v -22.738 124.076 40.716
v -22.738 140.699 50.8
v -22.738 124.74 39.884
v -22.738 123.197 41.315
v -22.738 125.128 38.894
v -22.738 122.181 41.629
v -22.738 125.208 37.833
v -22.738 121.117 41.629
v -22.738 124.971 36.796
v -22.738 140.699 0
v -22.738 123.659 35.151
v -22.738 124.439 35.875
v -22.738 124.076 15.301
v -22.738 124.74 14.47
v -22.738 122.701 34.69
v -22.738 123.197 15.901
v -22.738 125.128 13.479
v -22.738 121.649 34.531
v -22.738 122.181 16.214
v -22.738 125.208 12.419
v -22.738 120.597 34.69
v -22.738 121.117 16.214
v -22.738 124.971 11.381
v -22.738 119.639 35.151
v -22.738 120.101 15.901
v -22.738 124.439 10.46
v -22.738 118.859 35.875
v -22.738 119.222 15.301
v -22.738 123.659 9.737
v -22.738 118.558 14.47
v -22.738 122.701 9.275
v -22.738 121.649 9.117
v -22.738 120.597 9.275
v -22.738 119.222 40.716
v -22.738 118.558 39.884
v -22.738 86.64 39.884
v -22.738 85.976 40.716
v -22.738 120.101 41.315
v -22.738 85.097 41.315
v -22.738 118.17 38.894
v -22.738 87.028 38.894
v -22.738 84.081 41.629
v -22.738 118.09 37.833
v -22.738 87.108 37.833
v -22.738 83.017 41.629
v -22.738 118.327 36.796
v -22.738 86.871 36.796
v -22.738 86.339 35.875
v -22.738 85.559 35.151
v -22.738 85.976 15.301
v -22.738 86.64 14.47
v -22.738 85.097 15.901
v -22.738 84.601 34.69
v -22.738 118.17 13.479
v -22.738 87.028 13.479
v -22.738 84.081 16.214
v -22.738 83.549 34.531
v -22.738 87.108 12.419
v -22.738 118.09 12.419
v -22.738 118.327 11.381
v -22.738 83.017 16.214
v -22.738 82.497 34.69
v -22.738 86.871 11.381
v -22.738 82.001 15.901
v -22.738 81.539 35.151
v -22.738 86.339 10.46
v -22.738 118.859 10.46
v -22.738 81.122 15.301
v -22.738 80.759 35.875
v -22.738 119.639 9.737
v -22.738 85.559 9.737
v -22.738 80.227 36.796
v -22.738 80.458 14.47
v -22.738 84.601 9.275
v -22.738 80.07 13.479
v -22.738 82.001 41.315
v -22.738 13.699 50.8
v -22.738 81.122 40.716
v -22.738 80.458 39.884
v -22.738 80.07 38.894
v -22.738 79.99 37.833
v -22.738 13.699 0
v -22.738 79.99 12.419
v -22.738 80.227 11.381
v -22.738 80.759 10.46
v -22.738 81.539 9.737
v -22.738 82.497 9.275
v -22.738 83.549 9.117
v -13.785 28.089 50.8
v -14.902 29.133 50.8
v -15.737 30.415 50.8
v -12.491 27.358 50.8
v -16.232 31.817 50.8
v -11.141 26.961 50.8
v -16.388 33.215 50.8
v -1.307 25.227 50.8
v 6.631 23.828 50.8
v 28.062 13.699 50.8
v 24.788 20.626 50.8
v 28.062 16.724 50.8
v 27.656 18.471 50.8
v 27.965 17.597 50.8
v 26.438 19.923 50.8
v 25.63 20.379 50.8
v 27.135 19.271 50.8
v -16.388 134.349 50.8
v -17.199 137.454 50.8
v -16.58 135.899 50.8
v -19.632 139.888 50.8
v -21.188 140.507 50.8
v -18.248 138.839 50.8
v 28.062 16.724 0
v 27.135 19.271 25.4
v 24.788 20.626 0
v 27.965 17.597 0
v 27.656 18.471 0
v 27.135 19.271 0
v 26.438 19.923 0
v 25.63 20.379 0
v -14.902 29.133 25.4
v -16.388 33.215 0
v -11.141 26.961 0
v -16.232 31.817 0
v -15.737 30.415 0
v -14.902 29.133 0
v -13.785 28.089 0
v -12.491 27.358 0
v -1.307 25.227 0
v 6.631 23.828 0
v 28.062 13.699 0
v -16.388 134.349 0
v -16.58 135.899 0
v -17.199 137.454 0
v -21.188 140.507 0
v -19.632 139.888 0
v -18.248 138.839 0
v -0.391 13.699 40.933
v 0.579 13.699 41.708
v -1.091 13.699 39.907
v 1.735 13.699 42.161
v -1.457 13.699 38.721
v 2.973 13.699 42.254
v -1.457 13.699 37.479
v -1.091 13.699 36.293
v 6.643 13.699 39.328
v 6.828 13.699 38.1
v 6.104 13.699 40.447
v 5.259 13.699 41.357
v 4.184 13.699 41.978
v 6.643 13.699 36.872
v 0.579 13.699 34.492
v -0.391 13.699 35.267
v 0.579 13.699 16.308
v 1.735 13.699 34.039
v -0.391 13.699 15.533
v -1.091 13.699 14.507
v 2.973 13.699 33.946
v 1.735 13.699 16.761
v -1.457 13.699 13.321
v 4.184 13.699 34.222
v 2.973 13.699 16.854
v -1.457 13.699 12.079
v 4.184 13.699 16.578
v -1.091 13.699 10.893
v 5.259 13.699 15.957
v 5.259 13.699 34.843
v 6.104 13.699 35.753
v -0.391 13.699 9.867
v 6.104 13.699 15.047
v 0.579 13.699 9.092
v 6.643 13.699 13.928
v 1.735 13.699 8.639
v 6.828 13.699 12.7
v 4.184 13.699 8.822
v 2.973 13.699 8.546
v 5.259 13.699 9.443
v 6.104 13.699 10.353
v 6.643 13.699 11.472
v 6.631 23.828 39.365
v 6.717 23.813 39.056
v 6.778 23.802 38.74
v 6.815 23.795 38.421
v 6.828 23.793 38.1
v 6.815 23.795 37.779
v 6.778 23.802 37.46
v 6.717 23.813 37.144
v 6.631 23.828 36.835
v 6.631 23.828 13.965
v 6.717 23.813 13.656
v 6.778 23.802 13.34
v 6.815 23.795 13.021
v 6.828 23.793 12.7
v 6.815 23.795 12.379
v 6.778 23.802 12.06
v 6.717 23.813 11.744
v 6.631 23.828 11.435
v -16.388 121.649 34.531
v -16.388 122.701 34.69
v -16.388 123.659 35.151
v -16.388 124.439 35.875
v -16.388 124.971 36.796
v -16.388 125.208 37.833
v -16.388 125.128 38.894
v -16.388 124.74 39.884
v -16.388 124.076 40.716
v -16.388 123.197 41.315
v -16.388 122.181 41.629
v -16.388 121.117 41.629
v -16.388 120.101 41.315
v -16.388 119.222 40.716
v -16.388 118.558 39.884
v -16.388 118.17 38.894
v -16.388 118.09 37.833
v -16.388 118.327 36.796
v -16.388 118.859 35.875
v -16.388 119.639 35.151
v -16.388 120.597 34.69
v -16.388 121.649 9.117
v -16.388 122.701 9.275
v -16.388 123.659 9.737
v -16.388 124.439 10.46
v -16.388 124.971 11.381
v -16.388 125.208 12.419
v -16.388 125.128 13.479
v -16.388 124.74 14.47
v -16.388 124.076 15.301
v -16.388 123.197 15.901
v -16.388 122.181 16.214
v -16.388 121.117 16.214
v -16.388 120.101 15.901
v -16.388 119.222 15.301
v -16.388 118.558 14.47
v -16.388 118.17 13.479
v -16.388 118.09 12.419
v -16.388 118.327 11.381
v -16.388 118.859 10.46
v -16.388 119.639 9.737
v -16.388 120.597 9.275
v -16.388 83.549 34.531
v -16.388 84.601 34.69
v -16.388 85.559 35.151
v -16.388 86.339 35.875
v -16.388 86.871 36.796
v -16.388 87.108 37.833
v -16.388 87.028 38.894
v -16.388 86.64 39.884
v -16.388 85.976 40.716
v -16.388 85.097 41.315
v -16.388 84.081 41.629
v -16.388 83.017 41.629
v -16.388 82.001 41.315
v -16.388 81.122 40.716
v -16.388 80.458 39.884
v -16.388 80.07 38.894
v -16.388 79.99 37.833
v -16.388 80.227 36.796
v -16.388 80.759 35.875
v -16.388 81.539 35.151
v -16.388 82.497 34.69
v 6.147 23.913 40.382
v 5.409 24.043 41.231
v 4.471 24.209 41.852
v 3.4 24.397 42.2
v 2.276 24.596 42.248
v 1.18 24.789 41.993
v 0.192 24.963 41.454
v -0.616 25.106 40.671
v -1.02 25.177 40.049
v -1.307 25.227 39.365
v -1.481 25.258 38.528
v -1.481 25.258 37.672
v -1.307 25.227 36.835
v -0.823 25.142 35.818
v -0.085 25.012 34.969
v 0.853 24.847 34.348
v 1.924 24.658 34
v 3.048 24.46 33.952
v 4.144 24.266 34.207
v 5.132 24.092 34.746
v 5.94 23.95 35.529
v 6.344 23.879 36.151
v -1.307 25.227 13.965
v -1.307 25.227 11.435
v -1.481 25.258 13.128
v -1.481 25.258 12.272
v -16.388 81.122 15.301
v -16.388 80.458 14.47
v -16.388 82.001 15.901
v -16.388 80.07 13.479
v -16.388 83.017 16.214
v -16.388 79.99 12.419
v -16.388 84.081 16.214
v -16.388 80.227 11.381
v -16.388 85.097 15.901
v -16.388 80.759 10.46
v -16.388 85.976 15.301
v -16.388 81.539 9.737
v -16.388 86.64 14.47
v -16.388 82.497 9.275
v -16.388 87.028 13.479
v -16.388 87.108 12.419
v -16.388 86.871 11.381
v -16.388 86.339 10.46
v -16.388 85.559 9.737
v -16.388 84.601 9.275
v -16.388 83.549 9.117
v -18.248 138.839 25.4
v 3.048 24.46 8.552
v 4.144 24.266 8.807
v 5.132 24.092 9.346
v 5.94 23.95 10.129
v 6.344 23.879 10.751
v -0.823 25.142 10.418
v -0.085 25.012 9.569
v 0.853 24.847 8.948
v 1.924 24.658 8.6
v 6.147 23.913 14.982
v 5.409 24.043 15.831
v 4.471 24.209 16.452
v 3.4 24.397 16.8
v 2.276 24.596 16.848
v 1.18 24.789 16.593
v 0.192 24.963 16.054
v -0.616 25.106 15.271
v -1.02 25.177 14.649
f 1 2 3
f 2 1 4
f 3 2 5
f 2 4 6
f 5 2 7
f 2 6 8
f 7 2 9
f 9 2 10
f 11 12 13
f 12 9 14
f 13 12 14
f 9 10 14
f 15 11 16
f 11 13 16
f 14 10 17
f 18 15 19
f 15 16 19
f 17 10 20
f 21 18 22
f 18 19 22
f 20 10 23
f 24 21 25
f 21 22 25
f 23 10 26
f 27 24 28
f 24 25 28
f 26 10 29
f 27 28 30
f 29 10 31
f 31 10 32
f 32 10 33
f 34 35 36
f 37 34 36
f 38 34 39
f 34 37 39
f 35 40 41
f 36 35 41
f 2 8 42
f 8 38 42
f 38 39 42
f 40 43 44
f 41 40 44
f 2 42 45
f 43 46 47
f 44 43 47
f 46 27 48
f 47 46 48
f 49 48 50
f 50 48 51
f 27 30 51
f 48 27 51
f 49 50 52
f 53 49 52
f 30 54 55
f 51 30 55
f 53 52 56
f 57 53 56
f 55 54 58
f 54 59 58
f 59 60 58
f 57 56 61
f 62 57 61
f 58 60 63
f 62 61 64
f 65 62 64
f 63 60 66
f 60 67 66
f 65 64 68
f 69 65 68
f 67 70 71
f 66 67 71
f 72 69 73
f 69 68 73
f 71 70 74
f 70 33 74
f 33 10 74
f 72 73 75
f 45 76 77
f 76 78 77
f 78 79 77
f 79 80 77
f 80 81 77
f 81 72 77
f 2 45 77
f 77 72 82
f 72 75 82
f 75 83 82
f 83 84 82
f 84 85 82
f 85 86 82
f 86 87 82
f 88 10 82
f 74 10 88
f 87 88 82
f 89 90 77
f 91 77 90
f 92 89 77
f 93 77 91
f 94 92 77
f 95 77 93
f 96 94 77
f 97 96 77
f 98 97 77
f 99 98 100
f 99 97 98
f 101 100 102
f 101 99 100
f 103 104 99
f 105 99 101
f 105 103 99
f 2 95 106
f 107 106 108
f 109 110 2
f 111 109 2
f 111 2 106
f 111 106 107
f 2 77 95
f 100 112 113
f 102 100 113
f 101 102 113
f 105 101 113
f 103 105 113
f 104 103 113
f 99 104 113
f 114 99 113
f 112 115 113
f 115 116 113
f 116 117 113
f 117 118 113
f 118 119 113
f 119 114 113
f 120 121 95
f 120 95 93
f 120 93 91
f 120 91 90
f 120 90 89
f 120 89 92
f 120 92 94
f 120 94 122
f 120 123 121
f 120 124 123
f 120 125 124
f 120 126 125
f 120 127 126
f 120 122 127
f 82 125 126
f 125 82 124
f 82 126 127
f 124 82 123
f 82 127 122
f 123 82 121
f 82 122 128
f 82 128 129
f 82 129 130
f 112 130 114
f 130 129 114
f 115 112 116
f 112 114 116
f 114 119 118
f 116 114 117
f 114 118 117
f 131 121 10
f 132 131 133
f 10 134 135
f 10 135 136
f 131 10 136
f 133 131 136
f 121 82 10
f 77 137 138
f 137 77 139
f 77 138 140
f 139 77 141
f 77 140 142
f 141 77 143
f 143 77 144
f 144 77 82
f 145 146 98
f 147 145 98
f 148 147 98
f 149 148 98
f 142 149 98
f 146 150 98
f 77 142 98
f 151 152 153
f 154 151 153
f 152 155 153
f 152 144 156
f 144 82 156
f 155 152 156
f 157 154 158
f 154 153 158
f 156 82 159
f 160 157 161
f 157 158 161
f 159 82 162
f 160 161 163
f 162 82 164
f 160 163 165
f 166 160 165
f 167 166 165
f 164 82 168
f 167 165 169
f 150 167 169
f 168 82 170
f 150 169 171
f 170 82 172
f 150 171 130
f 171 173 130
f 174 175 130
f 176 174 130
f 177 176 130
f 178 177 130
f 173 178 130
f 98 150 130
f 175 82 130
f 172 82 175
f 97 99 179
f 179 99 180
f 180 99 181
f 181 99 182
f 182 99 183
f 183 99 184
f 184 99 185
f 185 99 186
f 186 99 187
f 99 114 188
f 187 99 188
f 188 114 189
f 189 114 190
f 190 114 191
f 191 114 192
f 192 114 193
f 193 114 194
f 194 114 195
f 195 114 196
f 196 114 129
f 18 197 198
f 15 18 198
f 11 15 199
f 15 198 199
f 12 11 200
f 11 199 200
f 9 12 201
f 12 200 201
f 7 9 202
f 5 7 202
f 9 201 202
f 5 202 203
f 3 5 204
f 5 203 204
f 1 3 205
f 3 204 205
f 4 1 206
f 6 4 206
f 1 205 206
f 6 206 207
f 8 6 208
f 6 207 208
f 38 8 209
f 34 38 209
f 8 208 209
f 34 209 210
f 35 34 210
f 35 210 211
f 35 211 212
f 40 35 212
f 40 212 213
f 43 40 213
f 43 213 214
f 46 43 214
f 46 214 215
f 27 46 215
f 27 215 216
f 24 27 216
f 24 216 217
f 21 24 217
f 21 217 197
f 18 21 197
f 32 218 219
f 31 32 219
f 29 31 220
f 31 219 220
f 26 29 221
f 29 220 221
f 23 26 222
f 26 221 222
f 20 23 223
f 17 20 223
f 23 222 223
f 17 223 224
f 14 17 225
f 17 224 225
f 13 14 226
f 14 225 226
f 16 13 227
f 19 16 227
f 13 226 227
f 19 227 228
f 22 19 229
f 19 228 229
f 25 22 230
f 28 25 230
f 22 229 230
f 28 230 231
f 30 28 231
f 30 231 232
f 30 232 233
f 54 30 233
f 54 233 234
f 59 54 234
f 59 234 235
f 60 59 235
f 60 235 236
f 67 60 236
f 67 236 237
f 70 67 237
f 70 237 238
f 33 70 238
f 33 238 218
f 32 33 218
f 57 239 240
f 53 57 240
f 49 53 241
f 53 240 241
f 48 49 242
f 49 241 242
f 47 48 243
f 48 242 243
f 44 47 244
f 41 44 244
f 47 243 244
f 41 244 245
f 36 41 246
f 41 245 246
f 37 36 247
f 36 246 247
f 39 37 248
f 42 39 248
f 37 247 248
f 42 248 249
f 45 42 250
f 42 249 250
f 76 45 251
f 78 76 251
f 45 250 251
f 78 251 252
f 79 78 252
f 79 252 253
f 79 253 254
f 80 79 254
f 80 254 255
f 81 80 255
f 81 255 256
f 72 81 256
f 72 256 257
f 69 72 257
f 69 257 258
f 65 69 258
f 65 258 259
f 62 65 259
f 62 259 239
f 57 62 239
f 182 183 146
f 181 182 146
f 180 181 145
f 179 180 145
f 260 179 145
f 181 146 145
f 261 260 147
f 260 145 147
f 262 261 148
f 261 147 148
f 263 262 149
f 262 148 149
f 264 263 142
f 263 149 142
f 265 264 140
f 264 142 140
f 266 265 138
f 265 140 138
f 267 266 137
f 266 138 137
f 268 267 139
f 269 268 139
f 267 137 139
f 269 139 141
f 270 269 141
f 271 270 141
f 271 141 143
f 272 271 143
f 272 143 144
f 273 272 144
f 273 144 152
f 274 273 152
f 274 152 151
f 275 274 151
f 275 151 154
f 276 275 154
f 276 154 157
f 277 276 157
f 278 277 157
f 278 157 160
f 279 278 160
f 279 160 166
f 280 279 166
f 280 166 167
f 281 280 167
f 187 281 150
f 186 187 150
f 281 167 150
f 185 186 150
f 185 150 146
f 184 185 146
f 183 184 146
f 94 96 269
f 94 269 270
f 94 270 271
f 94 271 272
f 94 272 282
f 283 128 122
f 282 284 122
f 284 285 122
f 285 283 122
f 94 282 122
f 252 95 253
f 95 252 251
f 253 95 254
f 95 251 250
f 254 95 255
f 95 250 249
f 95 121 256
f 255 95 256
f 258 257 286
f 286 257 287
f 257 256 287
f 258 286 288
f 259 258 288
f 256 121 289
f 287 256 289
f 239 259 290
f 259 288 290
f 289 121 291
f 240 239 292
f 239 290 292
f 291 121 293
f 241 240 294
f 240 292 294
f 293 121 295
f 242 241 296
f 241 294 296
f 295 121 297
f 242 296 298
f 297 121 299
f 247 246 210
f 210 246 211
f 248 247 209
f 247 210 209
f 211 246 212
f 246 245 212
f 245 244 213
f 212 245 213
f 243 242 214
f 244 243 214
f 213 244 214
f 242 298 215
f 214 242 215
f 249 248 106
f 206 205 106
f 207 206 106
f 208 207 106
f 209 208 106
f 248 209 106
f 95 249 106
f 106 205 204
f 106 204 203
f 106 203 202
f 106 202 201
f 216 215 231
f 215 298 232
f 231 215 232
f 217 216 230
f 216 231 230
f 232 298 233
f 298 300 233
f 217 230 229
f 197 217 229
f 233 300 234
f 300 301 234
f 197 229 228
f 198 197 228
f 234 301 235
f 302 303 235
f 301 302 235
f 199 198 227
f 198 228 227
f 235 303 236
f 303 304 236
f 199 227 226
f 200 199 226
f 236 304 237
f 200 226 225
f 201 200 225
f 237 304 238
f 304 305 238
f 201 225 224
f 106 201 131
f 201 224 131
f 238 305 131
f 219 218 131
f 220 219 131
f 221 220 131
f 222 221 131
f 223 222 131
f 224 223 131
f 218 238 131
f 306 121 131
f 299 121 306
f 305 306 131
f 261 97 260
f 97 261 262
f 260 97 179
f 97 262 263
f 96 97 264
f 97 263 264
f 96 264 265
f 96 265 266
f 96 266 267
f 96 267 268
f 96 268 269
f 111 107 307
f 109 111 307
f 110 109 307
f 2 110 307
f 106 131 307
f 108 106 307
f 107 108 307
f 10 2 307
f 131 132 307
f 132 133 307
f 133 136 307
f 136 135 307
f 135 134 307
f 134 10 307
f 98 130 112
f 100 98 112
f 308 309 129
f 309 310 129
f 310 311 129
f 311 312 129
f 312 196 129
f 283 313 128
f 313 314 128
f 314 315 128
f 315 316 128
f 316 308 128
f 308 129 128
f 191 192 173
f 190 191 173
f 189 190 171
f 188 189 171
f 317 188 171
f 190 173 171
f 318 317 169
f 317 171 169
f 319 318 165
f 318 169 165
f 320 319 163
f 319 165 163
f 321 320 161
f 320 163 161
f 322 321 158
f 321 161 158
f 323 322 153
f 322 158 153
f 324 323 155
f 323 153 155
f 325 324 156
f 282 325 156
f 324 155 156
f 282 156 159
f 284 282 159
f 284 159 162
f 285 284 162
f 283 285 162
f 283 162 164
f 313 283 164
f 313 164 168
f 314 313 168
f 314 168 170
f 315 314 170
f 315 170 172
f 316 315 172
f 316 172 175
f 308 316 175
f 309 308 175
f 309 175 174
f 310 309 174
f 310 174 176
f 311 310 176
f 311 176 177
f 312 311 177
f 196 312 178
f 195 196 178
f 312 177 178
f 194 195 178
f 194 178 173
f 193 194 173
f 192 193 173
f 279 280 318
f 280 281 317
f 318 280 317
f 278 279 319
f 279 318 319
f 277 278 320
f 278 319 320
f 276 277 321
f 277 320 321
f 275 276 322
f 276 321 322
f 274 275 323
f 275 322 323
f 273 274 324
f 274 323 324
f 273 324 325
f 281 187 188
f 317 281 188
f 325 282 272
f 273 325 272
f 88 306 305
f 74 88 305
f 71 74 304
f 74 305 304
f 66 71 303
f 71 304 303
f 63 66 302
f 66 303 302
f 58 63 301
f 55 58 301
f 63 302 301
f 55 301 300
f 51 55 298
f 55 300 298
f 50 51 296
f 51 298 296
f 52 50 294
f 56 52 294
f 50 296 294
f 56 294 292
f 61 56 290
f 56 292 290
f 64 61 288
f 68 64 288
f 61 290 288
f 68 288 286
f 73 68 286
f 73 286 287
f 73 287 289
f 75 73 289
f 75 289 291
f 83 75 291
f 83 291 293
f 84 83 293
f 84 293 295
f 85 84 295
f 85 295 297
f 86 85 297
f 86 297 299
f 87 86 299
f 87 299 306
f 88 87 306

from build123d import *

# Parameters (mm, degrees)
EXTRUDE1_DEPTH     = 50.8
SKETCH2_R          = 3.5687
CUT_EXTRUDE1_DEPTH = 7.3500001
SKETCH3_R          = 4.1656
CUT_EXTRUDE2_DEPTH = 128.0000001


with BuildPart() as part:
    # Sketch1 → Extrude1 (new body)
    with BuildSketch(Plane.XY):
        with BuildLine():
            Line((24.787766027, 20.626332144), (6.630852488, 23.827885887))
            Line((6.630852488, 23.827885887), (-1.306647512, 25.227481296))
            Line((-1.306647512, 25.227481296), (-11.14056344, 26.961466))
            add(Edge.make_bspline(
                [(-16.387897512, 33.214995232), (-16.387897512, 27.886712574), (-11.14056344, 26.961466)],
                knots=[1.570796327, 1.570796327, 1.570796327, 2.967059728, 2.967059728, 2.967059728], degree=2, weights=[1, 0.766044443, 1]))
            Line((-16.387897512, 33.214995232), (-16.387897512, 79.980278282))
            Line((-16.387897512, 79.980278282), (-16.387897512, 87.117678282))
            Line((-16.387897512, 87.117678282), (-16.387897512, 118.080278282))
            Line((-16.387897512, 118.080278282), (-16.387897512, 125.217678282))
            Line((-16.387897512, 125.217678282), (-16.387897512, 134.348978282))
            add(Edge.make_bspline(
                [(-16.387897512, 134.348978282), (-16.387897512, 140.698978282), (-22.737897512, 140.698978282)],
                knots=[3.141592654, 3.141592654, 3.141592654, 4.71238898, 4.71238898, 4.71238898], degree=2, weights=[1, 0.707106781, 1]))
            Line((-22.737897512, 140.698978282), (-22.737897512, 125.217678282))
            Line((-22.737897512, 125.217678282), (-22.737897512, 118.080278282))
            Line((-22.737897512, 118.080278282), (-22.737897512, 87.117678282))
            Line((-22.737897512, 87.117678282), (-22.737897512, 79.980278282))
            Line((-22.737897512, 79.980278282), (-22.737897512, 13.698978282))
            Line((-22.737897512, 13.698978282), (-1.306647512, 13.698978282))
            Line((-1.306647512, 13.698978282), (6.630852488, 13.698978282))
            Line((6.630852488, 13.698978282), (28.062102488, 13.698978282))
            Line((28.062102488, 13.698978282), (28.062102488, 16.724129903))
            add(Edge.make_bspline(
                [(28.062102488, 16.724129903), (28.062102488, 20.048978282), (24.787766027, 20.626332144)],
                knots=[0, 0, 0, 1.396263402, 1.396263402, 1.396263402], degree=2, weights=[1, 0.766044443, 1]))
        make_face()
    extrude(amount=EXTRUDE1_DEPTH)

    # Sketch2 → Cut-Extrude1 (cut, through all)
    with BuildSketch(Plane(origin=(-16.387897512, 0, 0), x_dir=(0, 0, -1), z_dir=(1, 0, 0))):
        with Locations((-38.1, 121.648978282)):
            Circle(SKETCH2_R)
        with Locations((-38.1, 83.548978282)):
            Circle(SKETCH2_R)
        with Locations((-12.685238078, 83.548978282)):
            Circle(SKETCH2_R)
        with Locations((-12.685238078, 121.64899544)):
            Circle(SKETCH2_R)
    extrude(amount=-CUT_EXTRUDE1_DEPTH, mode=Mode.SUBTRACT)

    # Sketch3 → Cut-Extrude2 (cut, through all)
    with BuildSketch(Plane.XZ.offset(-13.698978282)):
        with Locations((2.662102488, 12.7)):
            Circle(SKETCH3_R)
        with Locations((2.662102488, 38.1)):
            Circle(SKETCH3_R)
    extrude(amount=-CUT_EXTRUDE2_DEPTH, mode=Mode.SUBTRACT)


solid = part.part
